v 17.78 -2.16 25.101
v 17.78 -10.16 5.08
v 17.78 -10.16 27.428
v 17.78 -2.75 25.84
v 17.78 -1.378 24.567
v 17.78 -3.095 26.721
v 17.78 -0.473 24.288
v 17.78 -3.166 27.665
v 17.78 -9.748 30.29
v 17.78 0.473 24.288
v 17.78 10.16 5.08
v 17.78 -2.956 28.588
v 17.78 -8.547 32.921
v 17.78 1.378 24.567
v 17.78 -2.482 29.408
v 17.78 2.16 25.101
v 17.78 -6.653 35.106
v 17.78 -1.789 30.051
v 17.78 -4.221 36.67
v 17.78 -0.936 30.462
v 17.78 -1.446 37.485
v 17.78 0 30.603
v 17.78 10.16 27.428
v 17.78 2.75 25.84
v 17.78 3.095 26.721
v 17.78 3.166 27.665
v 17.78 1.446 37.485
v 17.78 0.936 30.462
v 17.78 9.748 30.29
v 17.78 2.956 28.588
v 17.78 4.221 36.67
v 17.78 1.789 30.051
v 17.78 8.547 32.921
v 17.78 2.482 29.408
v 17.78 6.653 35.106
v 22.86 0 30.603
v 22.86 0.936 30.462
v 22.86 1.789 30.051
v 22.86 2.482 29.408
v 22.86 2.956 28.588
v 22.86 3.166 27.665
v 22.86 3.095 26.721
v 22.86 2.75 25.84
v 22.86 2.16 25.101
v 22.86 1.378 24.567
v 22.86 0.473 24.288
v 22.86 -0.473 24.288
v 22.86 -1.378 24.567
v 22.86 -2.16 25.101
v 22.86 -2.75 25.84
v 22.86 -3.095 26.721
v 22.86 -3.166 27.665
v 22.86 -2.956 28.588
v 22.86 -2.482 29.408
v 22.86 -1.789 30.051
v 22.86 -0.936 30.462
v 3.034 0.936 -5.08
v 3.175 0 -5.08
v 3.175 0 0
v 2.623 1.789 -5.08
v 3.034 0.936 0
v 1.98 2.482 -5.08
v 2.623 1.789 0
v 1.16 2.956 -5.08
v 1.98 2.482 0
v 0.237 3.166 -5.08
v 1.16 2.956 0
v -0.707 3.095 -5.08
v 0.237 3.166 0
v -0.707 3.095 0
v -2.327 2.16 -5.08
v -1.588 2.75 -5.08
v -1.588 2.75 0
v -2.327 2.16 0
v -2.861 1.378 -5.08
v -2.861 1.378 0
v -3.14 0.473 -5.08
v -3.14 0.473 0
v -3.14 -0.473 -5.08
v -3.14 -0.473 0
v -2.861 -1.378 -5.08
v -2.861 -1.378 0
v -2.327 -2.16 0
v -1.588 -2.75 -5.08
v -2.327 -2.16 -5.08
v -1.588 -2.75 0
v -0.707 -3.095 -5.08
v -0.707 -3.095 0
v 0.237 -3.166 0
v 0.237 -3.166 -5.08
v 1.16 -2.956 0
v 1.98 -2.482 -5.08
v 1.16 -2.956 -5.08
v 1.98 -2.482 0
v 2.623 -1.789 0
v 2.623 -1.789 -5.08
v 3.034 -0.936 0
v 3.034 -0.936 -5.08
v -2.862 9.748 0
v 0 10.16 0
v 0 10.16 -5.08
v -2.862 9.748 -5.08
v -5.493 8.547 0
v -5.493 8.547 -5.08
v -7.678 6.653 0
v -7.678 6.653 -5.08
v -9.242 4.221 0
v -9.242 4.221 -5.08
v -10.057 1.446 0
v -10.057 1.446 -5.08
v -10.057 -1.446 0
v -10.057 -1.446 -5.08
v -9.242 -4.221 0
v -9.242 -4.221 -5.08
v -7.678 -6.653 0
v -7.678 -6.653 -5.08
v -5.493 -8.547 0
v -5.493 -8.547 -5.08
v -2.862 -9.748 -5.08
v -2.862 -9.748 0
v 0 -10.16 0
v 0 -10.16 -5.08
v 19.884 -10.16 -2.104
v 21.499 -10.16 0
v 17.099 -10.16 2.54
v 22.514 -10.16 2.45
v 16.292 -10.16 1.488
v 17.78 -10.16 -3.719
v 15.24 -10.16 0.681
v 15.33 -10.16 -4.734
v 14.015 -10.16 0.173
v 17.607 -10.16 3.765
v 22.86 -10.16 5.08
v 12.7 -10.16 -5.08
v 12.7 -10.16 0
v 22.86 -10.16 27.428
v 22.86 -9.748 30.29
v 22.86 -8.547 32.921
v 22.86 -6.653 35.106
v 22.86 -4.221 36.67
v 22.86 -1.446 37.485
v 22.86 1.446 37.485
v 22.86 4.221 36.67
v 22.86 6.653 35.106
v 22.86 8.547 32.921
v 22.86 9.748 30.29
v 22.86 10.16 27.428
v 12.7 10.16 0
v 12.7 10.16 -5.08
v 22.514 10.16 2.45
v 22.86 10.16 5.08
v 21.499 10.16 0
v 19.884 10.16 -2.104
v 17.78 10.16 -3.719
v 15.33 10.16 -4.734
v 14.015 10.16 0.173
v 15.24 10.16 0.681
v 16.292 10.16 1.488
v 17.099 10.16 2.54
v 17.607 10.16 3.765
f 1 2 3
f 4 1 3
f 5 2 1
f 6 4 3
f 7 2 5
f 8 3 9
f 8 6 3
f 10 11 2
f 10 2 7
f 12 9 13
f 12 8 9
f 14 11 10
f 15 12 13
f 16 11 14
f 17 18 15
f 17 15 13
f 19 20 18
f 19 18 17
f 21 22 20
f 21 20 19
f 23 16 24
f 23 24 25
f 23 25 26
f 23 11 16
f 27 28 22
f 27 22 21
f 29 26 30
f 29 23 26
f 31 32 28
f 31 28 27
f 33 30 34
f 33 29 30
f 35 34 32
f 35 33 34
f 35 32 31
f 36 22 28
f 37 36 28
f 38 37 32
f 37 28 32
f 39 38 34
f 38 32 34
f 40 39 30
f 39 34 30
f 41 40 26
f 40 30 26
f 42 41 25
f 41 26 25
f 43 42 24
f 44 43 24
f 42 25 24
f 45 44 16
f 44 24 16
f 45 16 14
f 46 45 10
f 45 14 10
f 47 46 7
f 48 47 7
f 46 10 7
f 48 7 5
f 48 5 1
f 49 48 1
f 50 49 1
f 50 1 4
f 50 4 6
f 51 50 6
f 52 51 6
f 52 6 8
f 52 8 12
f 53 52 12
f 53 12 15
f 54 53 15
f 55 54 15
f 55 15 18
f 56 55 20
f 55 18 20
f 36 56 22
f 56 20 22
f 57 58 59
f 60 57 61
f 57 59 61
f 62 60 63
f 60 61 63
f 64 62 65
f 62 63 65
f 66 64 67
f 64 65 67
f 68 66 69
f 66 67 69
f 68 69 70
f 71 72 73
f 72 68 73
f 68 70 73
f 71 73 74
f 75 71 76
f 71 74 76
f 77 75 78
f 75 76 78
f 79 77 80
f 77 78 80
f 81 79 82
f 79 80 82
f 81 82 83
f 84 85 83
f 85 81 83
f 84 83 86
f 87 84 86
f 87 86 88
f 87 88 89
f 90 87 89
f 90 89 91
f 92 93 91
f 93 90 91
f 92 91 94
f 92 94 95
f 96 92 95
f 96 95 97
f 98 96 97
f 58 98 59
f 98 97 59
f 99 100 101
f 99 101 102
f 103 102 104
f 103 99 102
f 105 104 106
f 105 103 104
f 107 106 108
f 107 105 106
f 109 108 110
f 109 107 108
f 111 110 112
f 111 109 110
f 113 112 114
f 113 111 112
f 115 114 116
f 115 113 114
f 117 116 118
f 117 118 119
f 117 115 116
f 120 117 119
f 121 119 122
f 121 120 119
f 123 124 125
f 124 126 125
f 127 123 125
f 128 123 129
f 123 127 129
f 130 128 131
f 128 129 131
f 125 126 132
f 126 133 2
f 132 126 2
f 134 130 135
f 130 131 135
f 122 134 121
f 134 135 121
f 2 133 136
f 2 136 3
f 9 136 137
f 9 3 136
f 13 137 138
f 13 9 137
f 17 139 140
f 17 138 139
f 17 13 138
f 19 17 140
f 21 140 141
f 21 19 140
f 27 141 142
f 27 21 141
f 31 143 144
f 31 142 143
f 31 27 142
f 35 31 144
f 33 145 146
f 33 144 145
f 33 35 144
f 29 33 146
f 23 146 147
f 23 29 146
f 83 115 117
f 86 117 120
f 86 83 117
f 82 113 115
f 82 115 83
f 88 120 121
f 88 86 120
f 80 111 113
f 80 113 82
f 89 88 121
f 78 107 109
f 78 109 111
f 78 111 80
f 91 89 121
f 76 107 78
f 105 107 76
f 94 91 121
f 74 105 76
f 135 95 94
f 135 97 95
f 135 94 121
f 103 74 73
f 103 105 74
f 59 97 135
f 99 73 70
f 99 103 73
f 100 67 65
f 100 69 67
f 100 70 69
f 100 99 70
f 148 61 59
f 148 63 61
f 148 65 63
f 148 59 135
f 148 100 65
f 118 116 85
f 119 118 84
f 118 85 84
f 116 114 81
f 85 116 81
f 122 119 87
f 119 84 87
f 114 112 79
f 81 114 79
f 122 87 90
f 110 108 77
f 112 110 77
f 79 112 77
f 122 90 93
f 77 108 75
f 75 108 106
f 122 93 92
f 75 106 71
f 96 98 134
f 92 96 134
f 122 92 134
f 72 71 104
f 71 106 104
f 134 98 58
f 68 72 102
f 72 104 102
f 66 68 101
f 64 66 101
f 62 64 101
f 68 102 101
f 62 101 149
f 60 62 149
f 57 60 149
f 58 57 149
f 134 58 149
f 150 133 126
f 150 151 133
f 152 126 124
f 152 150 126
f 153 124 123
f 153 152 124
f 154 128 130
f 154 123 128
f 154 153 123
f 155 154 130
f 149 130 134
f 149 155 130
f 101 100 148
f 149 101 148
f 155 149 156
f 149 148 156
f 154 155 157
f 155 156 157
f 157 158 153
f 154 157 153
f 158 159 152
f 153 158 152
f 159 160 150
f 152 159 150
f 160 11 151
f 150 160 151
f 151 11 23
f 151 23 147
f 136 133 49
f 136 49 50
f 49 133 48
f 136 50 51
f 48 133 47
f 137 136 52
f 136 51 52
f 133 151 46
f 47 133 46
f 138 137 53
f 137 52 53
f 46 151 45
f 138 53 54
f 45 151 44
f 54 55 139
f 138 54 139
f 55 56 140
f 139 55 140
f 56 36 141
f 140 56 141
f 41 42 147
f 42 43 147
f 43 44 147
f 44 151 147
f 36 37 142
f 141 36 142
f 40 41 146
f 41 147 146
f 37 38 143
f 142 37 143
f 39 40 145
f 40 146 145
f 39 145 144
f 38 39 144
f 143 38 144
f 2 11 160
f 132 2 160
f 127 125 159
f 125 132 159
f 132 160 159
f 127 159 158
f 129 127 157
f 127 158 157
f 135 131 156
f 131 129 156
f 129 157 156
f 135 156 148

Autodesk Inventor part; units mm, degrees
ref_plane "YZ Plane" through (0, 0, 0) normal (1, 0, 0) x (0, 1, 0)
ref_plane "XZ Plane" through (0, 0, 0) normal (0, 1, 0) x (-1, 0, 0)
ref_plane "XY Plane" through (0, 0, 0) normal (0, 0, 1) x (1, 0, 0)
sketch "Sketch1" plane through (0, 0, 0) normal (0, 0, 1) x (1, 0, 0)
  circle A0 centre (0, 0) radius 10.16
  line L0 (0, 10.16) -> (12.7, 10.16)
  line L1 (12.7, 10.16) -> (12.7, -10.16)
  line L2 (12.7, -10.16) -> (0, -10.16)
  line L3 (0, -10.16) -> (0, 10.16)
  circle A1 centre (0, 0) radius 3.175
  line L4 (12.7, 10.16) -> (27.7876, 10.16)
  line L5 (27.7876, 10.16) -> (27.7876, -10.16)
  line L6 (27.7876, -10.16) -> (12.7, -10.16)
  line L7 (12.7, -10.16) -> (12.7, 10.16)
  line L8 (27.7876, 10.16) -> (43.0276, 10.16)
  line L9 (43.0276, 10.16) -> (43.0276, -10.16)
  line L10 (43.0276, -10.16) -> (27.7876, -10.16)
  line L11 (27.7876, -10.16) -> (27.7876, 10.16)
  circle A2 centre (43.0276, 0) radius 10.16
  circle A3 centre (43.0276, 0) radius 3.175
  point P0 (0, -10.16)
  point P1 (12.7, -10.16)
  point P2 (43.0276, -10.16)
  dimension "d0" = 20.32
  dimension "d1" = 6.35
  dimension "d2" = 12.7
  dimension "d5" = 15.0876
  dimension "d6" = 15.24
extrude "Extrusion1" add sketch "Sketch1" against normal blind 5.08 contours A0 L3 A1 | A0 L0 L1 L2 | L3 A1 A0 | L4 L5 L6 L1 | L8 A2 L10 L5 | A2 L9 A3 | L9 A3 A2
sketch "Sketch2" plane through (0, 0, 0) normal (0, 0, 1) x (1, 0, 0)
  line L0 (12.7, -10.16) -> (12.7, 10.16) projected
  point P0 (0, 0)
bend part "Bend Part1" radius 5.08 angle 90 line through (12.7, -10.16, 0) along (0, 1, 0) centre toward (0, 0, 1) moving side (1, 0, 0) both sides no
sketch "Sketch3" plane through (22.86, 0, 27.428) normal (1, 0, 0) x (0, 0, -1)
  line L0 (32.508, -10.16) -> (32.508, 10.16) projected
  line L1 (17.4204, -10.16) -> (17.4204, 10.16)
  line L2 (0, 10.16) -> (22.348, 10.16) projected
  point P0 (27.428, 0)
  dimension "d10" = 15.0876
equation "\"d10\" = d5"
properties part number "ForearmActuatorBracketLeft"
